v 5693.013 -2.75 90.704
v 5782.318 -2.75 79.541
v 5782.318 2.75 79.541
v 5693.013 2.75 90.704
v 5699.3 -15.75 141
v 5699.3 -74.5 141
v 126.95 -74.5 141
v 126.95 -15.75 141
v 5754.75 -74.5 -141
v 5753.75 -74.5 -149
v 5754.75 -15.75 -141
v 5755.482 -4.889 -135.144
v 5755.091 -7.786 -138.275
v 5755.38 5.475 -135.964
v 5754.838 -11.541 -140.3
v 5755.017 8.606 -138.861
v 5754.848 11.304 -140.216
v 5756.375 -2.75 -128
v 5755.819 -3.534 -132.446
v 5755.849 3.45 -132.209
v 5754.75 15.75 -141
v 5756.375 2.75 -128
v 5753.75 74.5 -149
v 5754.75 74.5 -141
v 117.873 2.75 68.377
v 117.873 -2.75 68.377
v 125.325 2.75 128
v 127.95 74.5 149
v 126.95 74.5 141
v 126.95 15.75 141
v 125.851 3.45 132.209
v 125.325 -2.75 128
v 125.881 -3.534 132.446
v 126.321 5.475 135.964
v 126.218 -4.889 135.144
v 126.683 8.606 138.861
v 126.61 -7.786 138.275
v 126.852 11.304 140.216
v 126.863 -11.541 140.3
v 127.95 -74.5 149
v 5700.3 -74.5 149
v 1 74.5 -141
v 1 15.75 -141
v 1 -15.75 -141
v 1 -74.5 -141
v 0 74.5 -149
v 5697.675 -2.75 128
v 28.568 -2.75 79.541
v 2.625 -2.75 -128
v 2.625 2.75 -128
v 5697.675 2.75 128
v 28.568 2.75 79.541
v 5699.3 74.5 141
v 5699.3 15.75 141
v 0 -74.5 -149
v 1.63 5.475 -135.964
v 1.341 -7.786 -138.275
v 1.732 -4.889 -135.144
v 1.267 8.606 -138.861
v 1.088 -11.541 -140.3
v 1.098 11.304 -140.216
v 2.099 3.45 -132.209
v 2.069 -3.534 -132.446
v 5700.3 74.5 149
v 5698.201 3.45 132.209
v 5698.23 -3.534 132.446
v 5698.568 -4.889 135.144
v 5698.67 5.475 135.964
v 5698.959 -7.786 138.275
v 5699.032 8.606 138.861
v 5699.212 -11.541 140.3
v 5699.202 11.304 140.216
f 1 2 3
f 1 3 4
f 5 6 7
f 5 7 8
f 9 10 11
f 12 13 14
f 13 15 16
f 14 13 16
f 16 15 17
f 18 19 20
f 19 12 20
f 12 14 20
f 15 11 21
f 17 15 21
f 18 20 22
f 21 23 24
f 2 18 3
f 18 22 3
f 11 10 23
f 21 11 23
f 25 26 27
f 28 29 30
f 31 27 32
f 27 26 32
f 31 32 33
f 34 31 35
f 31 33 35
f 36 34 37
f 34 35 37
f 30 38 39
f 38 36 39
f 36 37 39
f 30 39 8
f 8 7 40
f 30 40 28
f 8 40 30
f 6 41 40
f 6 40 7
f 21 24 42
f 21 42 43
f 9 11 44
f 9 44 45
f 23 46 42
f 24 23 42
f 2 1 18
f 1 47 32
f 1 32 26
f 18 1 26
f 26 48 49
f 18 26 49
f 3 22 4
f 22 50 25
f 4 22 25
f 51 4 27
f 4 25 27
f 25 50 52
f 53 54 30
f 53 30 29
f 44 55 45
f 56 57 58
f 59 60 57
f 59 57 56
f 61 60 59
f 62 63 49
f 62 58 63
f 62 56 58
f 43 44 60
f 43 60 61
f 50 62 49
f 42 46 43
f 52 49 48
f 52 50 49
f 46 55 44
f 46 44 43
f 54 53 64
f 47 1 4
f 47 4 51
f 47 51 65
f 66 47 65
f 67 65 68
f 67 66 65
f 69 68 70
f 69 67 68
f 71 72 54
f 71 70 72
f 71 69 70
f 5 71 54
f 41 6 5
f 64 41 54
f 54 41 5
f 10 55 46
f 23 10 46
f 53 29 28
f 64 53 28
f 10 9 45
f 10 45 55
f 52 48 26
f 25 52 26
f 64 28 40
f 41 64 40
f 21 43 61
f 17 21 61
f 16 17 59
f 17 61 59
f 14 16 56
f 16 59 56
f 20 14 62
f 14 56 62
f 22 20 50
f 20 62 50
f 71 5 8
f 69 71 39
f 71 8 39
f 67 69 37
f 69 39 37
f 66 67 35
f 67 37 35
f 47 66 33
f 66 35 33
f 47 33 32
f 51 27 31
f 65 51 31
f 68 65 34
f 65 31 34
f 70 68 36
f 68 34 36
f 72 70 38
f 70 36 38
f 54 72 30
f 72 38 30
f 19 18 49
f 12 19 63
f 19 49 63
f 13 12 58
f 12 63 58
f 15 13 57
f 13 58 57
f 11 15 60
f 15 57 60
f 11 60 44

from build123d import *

# Parameters (mm, degrees)
MEMBER_30_1_1_DEPTH      = 5791
CUT_EXTRUDE_1_DEPTH      = 5795.832439338
CUT_EXTRUDE_2_DEPTH      = 5794.431587798
CUT_EXTRUDE_2_DEPTH_BACK = 5794.431587798


with BuildPart() as part:
    # Sketch11 → Member 30_1_1 (new body)
    with BuildSketch(Plane.YZ):
        with BuildLine():
            Line((-15.75, -141), (-74.5, -141))
            Line((-74.5, -141), (-74.5, -149))
            Line((-74.5, -149), (74.5, -149))
            Line((74.5, -149), (74.5, -141))
            Line((74.5, -141), (15.75, -141))
            ThreePointArc((15.75, -141), (6.557611845, -137.192388155), (2.75, -128))
            Line((2.75, -128), (2.75, 128))
            ThreePointArc((2.75, 128), (6.557611845, 137.192388155), (15.75, 141))
            Line((15.75, 141), (74.5, 141))
            Line((74.5, 141), (74.5, 149))
            Line((74.5, 149), (-74.5, 149))
            Line((-74.5, 149), (-74.5, 141))
            Line((-74.5, 141), (-15.75, 141))
            ThreePointArc((-15.75, 141), (-6.557611845, 137.192388155), (-2.75, 128))
            Line((-2.75, 128), (-2.75, -128))
            ThreePointArc((-2.75, -128), (-6.557611845, -137.192388155), (-15.75, -141))
        make_face()
    extrude(amount=MEMBER_30_1_1_DEPTH)

    # Эскиз3 → Вырез-Вытянуть1 (cut, through all)
    with BuildSketch(Plane(origin=(0, 74.5, 0), x_dir=(1, 0, 0), z_dir=(0, 1, 0))):
        Polygon((0, -149), (0, 149), (37.25, -149), align=None)
        Polygon((5791, -149), (5791, 149), (5753.75, 149), align=None)
    extrude(amount=-CUT_EXTRUDE_1_DEPTH, mode=Mode.SUBTRACT)

    # Эскиз5 → Вырез-Вытянуть2 (cut, two sides: drawn at the far end of the back side and taken through both)
    with BuildSketch(Plane(origin=(0, 2.75, 0), x_dir=(1, 0, 0), z_dir=(0, 1, 0)).offset(-CUT_EXTRUDE_2_DEPTH_BACK)):
        Polygon((28.567568579, -79.54054863), (117.872577483, -68.377422517), (127.950399668, -149), (37.25, -149), align=None)
        Polygon((5782.317568579, -79.54054863), (5693.012559675, -90.703674743), (5700.299600332, -149), (5791, -149), align=None)
    extrude(amount=CUT_EXTRUDE_2_DEPTH + CUT_EXTRUDE_2_DEPTH_BACK, mode=Mode.SUBTRACT)


solid = part.part
